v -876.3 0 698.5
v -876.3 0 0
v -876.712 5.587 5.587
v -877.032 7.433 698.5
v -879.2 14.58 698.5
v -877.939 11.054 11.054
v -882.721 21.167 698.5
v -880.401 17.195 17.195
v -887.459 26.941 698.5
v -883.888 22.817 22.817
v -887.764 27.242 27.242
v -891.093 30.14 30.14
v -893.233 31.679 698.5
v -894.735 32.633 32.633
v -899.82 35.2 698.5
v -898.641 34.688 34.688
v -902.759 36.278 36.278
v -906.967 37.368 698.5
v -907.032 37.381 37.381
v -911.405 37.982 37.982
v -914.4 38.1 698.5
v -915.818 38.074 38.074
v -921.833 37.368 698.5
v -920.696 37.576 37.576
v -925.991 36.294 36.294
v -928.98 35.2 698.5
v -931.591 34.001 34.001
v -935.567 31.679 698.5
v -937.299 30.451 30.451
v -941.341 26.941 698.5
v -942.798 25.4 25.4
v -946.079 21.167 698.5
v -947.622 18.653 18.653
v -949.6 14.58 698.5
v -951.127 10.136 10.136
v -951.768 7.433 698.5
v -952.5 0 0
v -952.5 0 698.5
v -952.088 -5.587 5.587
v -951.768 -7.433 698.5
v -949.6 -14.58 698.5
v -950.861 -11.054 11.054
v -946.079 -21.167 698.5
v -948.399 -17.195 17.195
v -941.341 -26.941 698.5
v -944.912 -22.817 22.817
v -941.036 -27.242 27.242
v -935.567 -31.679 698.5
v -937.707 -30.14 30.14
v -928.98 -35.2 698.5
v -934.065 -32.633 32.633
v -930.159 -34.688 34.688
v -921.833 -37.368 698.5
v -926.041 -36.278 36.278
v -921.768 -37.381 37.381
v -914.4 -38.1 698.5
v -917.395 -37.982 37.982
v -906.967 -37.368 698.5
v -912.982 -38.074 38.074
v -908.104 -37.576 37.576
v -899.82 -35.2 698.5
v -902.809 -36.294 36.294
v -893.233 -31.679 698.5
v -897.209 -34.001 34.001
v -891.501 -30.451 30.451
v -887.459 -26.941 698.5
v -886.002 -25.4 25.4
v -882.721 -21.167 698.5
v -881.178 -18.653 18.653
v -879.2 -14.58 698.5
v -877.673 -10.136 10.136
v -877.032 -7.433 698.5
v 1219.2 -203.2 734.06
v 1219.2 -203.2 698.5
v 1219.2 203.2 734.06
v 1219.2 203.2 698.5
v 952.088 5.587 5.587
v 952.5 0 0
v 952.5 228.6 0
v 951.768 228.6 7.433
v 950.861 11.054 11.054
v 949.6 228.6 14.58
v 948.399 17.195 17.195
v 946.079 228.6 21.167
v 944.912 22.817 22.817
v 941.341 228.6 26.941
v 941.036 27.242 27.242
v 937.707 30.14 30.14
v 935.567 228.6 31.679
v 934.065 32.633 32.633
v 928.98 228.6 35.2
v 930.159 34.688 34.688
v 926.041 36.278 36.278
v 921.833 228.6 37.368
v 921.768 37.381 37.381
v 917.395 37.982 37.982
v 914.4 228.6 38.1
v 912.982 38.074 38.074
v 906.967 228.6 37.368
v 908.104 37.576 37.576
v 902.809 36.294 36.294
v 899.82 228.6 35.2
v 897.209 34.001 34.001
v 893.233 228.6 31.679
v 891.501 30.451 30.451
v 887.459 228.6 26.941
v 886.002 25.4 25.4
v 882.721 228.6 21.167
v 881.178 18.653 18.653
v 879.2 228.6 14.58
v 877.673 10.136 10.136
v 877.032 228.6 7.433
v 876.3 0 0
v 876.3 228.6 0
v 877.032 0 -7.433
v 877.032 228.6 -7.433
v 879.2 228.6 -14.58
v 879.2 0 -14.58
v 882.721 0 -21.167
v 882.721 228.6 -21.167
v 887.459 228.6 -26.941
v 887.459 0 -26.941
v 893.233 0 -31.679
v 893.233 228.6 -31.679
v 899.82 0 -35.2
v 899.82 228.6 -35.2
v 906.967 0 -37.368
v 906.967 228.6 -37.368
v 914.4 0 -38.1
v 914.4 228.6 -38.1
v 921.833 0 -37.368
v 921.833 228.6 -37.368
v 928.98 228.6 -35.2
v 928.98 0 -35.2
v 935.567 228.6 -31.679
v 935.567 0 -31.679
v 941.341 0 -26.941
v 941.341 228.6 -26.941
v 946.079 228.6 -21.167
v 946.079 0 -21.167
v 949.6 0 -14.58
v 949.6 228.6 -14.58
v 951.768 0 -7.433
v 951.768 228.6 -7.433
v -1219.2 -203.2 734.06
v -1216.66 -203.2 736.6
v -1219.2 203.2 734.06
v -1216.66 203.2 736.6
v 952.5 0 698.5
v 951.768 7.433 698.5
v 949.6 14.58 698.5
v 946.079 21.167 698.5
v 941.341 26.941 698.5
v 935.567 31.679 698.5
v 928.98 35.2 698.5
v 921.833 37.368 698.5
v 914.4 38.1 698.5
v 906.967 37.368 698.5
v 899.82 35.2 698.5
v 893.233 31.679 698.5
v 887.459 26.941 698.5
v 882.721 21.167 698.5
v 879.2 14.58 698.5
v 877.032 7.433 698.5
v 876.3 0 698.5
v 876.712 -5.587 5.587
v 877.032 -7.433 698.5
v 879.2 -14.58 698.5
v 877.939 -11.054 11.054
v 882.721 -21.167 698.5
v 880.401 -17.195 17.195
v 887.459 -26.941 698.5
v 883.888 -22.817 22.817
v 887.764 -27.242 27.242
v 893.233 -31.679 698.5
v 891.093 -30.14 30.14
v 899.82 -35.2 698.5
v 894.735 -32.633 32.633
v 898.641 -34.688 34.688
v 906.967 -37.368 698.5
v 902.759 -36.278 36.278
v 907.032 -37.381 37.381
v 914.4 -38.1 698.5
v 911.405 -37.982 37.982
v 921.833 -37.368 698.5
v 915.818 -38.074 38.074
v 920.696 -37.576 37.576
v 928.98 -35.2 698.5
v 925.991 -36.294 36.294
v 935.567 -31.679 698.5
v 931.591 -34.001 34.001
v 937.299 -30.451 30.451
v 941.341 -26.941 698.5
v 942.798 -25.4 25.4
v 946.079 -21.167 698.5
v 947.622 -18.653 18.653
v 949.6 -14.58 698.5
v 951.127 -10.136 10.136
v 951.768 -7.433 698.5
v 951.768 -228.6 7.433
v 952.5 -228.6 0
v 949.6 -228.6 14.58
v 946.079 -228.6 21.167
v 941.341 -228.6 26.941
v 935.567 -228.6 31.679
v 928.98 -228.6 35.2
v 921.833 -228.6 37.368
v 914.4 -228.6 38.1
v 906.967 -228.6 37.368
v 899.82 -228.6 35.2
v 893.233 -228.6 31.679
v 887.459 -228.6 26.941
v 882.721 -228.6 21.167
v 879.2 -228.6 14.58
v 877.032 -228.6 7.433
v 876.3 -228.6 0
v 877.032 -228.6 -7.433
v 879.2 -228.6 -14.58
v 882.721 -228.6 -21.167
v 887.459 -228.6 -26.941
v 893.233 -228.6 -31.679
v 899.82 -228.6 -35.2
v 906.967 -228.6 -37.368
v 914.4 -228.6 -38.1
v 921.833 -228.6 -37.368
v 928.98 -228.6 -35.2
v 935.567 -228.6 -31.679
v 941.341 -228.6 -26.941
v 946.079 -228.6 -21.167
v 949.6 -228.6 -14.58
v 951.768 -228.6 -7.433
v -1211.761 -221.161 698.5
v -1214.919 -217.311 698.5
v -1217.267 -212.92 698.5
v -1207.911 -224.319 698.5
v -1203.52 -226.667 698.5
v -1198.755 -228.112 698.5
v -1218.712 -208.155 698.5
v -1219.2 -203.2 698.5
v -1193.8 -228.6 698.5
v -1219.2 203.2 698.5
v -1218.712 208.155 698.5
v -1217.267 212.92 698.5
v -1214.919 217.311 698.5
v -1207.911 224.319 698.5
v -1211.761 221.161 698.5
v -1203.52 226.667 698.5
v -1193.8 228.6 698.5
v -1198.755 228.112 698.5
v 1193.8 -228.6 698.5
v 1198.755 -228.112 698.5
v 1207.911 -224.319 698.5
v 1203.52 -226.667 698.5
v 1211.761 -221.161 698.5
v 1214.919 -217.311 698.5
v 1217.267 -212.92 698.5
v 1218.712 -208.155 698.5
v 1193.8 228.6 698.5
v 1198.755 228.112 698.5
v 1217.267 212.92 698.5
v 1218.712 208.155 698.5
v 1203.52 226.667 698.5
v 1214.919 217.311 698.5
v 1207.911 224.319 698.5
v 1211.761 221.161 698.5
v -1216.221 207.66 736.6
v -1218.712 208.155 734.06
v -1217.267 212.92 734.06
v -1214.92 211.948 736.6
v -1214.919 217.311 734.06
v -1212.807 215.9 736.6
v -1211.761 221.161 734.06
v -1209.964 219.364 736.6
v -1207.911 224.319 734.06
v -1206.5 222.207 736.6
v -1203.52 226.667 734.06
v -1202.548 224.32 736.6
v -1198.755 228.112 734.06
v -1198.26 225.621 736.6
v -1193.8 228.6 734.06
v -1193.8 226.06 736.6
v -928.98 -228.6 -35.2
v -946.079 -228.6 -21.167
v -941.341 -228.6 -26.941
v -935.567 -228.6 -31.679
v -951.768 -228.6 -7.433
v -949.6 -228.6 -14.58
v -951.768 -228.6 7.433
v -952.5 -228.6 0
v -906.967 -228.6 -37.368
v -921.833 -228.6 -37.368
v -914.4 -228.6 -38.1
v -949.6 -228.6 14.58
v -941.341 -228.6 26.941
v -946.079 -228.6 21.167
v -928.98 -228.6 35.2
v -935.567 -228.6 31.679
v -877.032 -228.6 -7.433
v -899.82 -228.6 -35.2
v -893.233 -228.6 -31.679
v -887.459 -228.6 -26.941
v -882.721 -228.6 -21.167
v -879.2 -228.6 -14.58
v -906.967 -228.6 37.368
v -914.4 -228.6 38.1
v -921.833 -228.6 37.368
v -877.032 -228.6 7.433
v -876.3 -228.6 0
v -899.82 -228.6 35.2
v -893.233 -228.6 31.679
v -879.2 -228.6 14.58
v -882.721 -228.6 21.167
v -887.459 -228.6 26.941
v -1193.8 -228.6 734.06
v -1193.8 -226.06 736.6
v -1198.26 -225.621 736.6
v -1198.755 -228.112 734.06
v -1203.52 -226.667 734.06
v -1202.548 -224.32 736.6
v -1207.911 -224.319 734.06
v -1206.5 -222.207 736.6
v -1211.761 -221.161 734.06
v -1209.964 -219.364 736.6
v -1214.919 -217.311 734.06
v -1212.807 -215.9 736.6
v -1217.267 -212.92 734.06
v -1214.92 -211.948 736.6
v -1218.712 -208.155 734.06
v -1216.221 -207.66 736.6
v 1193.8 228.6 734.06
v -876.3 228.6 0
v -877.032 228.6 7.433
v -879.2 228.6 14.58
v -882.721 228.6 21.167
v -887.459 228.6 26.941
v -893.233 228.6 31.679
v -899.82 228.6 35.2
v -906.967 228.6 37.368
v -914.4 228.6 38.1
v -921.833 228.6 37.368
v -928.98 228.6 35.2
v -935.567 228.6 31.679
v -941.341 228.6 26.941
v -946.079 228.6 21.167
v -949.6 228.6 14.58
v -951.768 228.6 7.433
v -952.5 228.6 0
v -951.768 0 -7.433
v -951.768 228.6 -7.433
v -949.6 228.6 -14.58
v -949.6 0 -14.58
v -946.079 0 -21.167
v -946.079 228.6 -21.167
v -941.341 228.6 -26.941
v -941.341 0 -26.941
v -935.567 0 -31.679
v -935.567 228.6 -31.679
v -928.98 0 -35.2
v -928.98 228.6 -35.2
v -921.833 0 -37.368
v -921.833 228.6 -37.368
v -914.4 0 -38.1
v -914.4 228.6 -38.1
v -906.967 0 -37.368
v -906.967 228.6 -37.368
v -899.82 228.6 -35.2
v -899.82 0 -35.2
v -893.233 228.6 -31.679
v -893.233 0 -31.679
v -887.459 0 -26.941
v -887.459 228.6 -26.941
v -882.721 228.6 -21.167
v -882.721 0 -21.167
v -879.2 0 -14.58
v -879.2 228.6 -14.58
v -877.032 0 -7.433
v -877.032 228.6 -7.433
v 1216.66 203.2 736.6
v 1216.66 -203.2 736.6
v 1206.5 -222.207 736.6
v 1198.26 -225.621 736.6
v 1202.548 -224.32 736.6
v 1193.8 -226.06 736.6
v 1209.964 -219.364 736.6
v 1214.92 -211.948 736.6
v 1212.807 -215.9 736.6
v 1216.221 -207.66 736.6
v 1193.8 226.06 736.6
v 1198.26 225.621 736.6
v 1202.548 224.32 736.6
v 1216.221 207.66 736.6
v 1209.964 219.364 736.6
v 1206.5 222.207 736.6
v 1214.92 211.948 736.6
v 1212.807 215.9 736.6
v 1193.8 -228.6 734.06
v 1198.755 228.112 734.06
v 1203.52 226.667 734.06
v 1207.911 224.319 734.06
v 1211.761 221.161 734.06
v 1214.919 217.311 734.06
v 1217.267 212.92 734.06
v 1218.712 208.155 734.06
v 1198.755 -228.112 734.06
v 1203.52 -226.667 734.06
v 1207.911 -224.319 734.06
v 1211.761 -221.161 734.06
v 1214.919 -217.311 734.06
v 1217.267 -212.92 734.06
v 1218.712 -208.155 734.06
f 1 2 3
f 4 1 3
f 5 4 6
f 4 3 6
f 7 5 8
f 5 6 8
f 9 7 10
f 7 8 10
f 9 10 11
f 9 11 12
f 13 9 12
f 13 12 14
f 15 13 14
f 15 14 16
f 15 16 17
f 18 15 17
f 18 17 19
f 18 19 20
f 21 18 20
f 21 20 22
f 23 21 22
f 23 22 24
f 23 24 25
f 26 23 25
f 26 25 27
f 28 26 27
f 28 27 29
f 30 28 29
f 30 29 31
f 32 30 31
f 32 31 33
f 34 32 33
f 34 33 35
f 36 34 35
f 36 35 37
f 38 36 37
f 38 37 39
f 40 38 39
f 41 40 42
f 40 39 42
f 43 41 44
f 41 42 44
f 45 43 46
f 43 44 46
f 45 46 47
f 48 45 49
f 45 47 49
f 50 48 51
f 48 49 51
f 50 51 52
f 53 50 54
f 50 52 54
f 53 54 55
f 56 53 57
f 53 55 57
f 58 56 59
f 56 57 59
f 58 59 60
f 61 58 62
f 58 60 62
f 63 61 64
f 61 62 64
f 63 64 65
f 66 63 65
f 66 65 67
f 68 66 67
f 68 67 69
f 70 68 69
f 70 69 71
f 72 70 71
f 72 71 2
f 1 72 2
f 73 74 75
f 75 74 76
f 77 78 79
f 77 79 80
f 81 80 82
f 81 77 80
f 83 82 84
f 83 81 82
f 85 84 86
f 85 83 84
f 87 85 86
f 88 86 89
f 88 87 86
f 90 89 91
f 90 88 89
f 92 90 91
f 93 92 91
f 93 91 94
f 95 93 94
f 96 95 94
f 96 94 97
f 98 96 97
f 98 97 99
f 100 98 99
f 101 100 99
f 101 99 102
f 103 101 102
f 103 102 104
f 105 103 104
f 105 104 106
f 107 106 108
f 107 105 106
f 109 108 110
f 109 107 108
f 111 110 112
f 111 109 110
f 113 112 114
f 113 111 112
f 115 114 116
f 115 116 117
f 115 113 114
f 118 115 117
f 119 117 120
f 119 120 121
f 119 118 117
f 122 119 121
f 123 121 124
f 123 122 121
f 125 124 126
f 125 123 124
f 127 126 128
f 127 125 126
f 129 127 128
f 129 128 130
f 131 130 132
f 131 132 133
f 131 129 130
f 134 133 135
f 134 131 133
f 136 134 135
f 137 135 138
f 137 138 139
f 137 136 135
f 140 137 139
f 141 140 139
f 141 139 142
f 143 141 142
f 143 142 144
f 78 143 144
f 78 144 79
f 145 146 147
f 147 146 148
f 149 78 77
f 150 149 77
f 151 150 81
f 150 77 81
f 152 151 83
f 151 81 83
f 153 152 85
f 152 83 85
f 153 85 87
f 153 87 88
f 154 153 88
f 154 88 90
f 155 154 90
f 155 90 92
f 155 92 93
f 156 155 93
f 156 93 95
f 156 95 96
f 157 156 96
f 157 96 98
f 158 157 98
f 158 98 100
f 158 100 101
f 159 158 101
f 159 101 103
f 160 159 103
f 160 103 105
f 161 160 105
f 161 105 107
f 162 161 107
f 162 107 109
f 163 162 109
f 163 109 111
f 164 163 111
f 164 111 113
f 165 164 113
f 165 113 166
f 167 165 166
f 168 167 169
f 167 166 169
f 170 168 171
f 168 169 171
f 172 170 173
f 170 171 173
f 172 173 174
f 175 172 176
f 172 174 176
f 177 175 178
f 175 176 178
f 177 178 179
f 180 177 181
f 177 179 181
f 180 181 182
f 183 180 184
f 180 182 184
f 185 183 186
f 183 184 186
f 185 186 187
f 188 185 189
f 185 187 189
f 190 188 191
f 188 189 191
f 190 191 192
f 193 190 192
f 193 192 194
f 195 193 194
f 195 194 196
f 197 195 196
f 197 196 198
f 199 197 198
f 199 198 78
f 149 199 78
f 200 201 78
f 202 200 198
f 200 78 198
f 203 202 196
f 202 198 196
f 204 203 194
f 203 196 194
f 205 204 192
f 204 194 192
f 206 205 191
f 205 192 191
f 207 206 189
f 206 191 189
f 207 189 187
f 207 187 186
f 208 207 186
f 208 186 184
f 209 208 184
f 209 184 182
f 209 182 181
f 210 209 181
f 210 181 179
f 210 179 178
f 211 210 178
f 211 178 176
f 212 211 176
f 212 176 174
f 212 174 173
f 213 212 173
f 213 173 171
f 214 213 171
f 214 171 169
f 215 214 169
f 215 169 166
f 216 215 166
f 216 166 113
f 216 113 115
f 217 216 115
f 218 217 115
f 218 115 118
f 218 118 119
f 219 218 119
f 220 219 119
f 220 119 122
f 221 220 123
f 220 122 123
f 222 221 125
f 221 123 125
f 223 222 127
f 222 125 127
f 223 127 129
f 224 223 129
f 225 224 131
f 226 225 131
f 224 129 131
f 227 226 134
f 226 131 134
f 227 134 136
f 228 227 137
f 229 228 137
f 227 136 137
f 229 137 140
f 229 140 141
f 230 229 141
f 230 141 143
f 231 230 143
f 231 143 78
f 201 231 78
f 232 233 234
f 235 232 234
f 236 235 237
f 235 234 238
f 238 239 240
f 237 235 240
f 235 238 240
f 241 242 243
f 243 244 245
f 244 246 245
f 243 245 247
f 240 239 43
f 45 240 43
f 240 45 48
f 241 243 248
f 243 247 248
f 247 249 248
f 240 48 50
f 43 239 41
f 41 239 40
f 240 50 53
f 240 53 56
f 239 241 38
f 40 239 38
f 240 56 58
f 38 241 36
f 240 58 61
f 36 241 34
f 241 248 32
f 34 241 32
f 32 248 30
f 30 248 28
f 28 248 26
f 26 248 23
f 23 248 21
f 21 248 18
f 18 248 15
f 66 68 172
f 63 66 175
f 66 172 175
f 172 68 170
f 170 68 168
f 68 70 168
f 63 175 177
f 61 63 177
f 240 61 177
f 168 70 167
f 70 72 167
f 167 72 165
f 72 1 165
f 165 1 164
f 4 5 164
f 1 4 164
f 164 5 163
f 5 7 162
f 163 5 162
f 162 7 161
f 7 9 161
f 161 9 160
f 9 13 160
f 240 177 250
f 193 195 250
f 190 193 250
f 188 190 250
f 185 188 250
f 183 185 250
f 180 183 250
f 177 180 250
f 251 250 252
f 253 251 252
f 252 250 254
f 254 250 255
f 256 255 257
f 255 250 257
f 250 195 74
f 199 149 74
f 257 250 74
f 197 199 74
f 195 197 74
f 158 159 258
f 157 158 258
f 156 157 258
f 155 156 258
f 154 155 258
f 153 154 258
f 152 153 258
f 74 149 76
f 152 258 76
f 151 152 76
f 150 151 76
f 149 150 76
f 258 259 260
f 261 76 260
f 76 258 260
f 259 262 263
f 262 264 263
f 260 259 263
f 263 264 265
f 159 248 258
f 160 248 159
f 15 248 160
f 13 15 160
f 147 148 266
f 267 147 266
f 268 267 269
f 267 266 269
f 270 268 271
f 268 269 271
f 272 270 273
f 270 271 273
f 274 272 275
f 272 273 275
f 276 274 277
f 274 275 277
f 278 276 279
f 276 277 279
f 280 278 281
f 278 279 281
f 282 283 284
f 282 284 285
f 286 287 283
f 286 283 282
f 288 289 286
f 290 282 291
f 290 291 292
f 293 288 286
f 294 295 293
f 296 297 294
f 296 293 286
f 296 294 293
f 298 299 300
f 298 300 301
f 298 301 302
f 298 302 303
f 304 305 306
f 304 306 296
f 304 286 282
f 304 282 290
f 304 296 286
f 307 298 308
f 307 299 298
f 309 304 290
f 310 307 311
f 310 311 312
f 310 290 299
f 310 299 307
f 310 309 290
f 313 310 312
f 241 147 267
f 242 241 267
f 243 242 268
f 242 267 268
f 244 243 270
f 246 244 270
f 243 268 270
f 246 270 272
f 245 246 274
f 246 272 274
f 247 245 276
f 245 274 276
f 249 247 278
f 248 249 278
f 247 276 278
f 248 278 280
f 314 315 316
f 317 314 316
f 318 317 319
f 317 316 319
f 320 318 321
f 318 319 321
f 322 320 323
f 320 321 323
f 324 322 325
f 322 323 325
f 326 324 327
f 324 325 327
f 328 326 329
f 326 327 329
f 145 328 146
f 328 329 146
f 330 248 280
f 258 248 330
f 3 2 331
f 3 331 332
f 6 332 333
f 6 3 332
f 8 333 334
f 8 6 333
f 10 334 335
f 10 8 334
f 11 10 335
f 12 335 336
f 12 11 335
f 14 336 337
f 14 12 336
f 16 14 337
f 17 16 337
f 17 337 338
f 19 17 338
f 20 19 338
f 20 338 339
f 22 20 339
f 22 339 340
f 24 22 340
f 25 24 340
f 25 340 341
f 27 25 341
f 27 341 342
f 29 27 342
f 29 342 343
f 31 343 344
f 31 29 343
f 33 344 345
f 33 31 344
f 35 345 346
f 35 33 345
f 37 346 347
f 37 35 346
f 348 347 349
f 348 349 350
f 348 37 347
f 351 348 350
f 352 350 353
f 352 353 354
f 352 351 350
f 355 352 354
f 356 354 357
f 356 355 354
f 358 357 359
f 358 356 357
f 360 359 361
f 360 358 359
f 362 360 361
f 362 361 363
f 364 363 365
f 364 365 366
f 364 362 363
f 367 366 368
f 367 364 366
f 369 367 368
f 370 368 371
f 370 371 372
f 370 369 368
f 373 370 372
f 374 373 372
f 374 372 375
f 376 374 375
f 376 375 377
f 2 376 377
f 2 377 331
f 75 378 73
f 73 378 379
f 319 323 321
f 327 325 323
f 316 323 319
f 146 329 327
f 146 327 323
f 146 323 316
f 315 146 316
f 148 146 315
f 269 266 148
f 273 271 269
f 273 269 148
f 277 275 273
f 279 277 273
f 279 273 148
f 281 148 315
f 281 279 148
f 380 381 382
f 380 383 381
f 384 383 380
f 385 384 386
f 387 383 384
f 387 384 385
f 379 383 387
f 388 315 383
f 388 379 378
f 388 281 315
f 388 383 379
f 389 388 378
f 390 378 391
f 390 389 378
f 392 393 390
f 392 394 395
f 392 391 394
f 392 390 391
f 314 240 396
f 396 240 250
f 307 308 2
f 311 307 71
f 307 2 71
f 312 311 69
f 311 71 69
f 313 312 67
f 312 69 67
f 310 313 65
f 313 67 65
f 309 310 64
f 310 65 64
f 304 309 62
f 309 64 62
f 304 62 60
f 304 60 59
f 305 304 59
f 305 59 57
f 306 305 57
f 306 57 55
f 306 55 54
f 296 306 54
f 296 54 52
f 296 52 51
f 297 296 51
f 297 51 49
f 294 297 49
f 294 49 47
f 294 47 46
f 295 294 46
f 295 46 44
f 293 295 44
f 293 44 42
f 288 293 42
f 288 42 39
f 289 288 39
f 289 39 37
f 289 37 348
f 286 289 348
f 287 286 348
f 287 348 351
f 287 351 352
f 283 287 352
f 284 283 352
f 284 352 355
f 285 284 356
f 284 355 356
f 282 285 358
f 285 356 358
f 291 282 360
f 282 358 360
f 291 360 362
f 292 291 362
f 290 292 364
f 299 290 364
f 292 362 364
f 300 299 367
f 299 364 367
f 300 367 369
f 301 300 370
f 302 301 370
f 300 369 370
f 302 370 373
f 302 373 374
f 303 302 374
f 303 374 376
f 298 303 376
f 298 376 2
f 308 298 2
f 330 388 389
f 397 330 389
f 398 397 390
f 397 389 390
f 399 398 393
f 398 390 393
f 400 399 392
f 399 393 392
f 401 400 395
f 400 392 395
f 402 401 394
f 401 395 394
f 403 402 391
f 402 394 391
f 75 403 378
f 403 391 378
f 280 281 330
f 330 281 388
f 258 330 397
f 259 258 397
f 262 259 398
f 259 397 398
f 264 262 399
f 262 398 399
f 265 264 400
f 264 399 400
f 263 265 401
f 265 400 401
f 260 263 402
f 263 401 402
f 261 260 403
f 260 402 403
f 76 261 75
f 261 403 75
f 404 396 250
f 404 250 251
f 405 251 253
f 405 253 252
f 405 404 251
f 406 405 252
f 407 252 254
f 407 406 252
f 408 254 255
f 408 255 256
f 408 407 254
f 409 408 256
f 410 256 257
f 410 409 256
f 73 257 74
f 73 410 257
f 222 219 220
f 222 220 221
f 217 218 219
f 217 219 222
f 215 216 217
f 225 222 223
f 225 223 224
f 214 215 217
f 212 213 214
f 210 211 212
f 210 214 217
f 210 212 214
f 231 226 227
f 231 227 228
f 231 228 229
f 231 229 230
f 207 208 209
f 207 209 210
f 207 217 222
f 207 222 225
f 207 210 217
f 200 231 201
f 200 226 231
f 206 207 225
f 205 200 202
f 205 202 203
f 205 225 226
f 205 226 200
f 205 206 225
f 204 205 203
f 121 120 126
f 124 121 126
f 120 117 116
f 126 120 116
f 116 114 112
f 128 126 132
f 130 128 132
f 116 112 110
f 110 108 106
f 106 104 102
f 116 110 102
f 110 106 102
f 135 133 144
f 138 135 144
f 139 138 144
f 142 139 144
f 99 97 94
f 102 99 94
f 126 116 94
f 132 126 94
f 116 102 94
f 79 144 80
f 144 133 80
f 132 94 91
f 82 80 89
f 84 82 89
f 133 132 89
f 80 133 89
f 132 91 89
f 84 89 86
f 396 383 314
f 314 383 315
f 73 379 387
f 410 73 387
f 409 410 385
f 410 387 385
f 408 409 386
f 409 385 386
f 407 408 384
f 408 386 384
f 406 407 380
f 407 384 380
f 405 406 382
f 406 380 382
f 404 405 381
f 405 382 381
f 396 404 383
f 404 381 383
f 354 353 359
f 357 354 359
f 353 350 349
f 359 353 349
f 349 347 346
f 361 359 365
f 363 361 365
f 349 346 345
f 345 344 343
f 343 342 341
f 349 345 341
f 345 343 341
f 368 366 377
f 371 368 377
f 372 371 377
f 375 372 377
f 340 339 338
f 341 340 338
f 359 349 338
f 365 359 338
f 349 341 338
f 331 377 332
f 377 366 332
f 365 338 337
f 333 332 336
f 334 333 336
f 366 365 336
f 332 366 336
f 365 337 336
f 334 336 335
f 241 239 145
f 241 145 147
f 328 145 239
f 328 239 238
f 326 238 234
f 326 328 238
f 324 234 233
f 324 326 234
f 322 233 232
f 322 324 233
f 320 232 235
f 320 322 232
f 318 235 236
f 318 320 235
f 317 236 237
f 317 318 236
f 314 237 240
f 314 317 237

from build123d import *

# Parameters (mm, degrees)
F3_START      = 698.5
F2_W          = 2438.4
F2_H          = 457.2
F2_R          = 38.1
F3_DEPTH      = 38.1
F4_DEPTH      = 736.6
F5_R          = 38.1
F6_DEPTH      = 228.6
F6_DEPTH_BACK = 228.6
F7_R          = 25.4
F8_SIZE       = 2.54


# Not quite as in the source:
# - a variable given as a bare number and used for a length is read in inches; the dataset says mm whatever the document's units were


with BuildPart() as f3:
    # F2 (on Top) → F3 (new body)
    with BuildSketch(Plane.XY.offset(F3_START)):
        Rectangle(F2_W, F2_H)
        with Locations((-914.4, 0)):
            Circle(F2_R, mode=Mode.SUBTRACT)
        with Locations((914.4, 0)):
            Circle(F2_R, mode=Mode.SUBTRACT)
        with Locations((-914.4, 0)):
            Circle(F2_R)
        with Locations((914.4, 0)):
            Circle(F2_R)
    extrude(amount=F3_DEPTH)

    # F2 (on Top) → F4 (join)
    with BuildSketch(Plane.XY):
        with Locations((-914.4, 0)):
            Circle(F2_R)
        with Locations((914.4, 0)):
            Circle(F2_R)
    extrude(amount=F4_DEPTH)

    # F5 (on Front) → F6 (join, two sides)
    with BuildSketch(Plane.XZ) as f6_sk:
        with Locations((-914.4, 0)):
            Circle(F5_R)
        with Locations((914.4, 0)):
            Circle(F5_R)
    extrude(amount=F6_DEPTH)
    extrude(f6_sk.sketch, amount=-F6_DEPTH_BACK)

    # F7
    f7_edges = [f3.edges().sort_by_distance(p)[0] for p in [
        (1219.2, -228.6, 717.55),
        (1219.2, 228.6, 717.55),
        (-1219.2, -228.6, 717.55),
        (-1219.2, 228.6, 717.55),
    ]]
    fillet(f7_edges, radius=F7_R)

    # F8
    f8_edges = [f3.edges().sort_by_distance(p)[0] for p in [
        (-1219.2, 0, 736.6),
        (-1211.760512, 221.160512, 736.6),
        (0, 228.6, 736.6),
        (-1211.760512, -221.160512, 736.6),
        (0, -228.6, 736.6),
        (1219.2, 0, 736.6),
        (1211.760512, 221.160512, 736.6),
        (1211.760512, -221.160512, 736.6),
    ]]
    chamfer(f8_edges, length=F8_SIZE)


solid = f3.part
